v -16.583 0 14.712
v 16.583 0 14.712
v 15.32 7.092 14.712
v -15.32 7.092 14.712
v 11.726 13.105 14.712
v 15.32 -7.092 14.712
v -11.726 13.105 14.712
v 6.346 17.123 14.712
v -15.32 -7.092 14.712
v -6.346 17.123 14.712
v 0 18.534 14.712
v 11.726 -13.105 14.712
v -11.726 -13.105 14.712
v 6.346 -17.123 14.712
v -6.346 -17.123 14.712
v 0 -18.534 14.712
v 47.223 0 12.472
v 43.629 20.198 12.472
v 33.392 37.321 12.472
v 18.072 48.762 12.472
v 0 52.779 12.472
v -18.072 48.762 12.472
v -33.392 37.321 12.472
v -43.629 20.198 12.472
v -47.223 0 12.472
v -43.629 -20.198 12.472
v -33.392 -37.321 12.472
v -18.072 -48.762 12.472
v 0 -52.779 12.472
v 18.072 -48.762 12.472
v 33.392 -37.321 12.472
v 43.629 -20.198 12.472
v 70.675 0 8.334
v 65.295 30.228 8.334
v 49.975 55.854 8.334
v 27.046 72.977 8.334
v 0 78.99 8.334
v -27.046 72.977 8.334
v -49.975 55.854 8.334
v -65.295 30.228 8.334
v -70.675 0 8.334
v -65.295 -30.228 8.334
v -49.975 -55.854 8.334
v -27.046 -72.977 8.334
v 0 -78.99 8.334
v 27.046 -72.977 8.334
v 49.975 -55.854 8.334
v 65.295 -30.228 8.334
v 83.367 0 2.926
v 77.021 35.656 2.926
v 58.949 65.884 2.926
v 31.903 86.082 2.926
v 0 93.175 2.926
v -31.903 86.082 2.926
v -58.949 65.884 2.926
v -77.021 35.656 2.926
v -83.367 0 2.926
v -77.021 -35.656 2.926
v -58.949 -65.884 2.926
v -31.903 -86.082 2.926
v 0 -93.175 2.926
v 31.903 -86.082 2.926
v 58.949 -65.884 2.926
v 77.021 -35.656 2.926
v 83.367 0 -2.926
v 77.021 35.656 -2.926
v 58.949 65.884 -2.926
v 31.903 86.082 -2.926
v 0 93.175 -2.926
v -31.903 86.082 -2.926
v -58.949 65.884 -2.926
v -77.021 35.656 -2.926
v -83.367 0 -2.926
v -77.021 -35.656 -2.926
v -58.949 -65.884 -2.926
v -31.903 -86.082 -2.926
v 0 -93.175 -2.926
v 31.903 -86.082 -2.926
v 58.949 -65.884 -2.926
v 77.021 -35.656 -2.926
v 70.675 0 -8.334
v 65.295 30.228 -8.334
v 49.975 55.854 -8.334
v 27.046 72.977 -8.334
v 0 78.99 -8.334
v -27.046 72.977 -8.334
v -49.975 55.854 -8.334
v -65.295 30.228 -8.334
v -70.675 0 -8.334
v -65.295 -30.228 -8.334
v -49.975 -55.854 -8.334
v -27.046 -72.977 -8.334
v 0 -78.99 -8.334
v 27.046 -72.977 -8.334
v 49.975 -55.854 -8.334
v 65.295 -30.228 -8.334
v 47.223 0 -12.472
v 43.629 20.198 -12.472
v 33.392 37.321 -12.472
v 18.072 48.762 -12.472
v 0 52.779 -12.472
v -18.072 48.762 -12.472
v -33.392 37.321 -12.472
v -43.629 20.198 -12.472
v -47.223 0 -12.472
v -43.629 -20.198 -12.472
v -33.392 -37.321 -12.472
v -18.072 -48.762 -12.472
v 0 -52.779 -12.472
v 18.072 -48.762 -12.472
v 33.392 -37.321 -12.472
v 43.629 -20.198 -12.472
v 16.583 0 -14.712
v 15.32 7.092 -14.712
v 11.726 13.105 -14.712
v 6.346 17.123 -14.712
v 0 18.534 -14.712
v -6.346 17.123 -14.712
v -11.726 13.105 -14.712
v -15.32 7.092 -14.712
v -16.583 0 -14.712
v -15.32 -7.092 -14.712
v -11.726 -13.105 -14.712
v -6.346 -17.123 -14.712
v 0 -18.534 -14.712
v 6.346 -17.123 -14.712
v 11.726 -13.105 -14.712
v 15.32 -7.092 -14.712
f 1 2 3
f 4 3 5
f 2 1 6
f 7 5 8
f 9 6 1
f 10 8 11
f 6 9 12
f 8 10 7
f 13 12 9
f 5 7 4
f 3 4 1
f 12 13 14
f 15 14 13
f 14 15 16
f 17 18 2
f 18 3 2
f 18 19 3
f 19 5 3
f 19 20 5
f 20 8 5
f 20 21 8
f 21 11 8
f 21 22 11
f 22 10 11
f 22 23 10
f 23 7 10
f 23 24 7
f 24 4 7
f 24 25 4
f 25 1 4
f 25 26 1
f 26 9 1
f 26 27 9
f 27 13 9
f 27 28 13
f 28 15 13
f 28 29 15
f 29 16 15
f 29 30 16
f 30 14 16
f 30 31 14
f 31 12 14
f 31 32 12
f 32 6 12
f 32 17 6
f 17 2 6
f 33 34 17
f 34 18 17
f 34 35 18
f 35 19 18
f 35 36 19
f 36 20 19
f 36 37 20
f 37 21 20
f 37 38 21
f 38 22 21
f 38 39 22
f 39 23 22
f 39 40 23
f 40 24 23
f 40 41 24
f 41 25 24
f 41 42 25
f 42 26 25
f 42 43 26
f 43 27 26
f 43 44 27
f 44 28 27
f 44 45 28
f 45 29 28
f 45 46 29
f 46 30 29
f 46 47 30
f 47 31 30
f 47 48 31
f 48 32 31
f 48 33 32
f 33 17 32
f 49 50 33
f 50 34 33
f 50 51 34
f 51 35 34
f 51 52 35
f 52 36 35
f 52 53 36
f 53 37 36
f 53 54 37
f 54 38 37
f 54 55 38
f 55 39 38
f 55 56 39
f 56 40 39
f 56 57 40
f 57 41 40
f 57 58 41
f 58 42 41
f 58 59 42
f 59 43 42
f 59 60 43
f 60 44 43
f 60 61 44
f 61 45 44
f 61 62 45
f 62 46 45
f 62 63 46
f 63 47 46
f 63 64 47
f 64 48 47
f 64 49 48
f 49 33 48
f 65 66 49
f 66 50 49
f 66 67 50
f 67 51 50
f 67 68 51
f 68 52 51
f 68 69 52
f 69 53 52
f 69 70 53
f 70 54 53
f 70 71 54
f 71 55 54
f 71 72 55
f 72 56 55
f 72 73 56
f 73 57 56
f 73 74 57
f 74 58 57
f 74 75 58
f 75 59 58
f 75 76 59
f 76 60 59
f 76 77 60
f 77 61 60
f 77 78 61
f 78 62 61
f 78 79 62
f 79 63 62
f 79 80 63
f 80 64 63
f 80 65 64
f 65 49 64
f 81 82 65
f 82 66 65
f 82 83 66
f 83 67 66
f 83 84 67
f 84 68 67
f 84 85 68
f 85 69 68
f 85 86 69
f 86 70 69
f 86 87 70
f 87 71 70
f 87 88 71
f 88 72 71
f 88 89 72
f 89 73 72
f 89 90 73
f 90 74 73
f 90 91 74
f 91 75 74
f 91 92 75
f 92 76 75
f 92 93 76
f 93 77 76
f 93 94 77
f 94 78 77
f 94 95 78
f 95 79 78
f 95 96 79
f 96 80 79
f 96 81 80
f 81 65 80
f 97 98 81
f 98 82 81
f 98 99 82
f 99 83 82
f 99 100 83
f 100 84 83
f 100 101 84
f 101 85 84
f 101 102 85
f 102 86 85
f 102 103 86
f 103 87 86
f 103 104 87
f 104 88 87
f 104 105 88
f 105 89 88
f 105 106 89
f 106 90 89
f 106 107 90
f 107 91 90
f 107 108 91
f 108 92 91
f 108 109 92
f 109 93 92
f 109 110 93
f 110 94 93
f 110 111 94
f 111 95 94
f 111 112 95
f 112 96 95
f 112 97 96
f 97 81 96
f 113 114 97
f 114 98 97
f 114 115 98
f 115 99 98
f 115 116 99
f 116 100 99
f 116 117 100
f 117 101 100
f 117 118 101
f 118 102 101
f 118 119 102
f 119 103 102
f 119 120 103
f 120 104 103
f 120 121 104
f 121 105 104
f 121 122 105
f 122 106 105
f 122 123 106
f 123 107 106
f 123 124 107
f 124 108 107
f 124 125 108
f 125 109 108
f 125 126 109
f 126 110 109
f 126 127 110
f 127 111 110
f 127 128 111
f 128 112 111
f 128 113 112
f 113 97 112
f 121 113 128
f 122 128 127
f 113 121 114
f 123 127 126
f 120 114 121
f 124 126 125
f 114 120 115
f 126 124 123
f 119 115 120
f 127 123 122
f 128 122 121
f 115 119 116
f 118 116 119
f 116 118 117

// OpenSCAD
// Generated by SolidPython 1.0.1 on 2020-07-29 00:46:53


scale(v = [17, 19, 3]) {
	sphere(r = 5);
}
/***********************************************
*********      SolidPython code:      **********
************************************************
 
# import packages: SolidPython
from solid import *
from solid.utils import *
from itertools import chain, combinations, permutations


class Resize:

    def __init__(self, scad_file):
        self.scad_file = scad_file
        #self.scad_file = import_scad(scad_file)
        # cone/cylinder param:
        self.r1 = 0
        self.r2 = 0
        self.h = 0
        # rectangular prism param:
        self.w = 0
        self.l = 0
        # ellipse param:
        self.r = 0

    # import OpenScad code (file name corresponds to shape)


    # classify shape + parameters
    def assign(self, param1, param2, param3):
        if self.scad_file == 'cone.scad':
            self.r1 = param1
            self.r2 = param2
            self.h = param3
        elif self.scad_file == 'cylinder.scad':
            self.r1 = param1
            self.r2 = param2
            self.h = param3
        elif self.scad_file == 'rectangularPrism.scad':
            self.h = param1
            self.l = param2
            self.w = param3
        else:
            self.r = param1
            self.h = param2

    # resize parameters
    def iterate(self):
        x = range(3, 20, 2)
        i = 1
        if self.scad_file == 'cone.scad':
            tempList = list(permutations(x, 2))
            for temp in tempList:
                param1 = temp[0]
                param2 = temp[1]
                filepath = 'produced_scad_files/' + 'cone' + str(param1) + '_' + str(param2) + '_' + '.scad'
                scad_render_to_file(cylinder(h=param1, r1=param2, r2=0), filepath)

        elif self.scad_file == 'cylinder.scad':
            tempList = list(permutations(x, 3))
            for temp in tempList:
                param1 = temp[0]
                param2 = temp[1]
                filepath = 'produced_scad_files/' + 'cylinder' + str(param1) + '_' + str(param2) + '_' + '.scad'
                scad_render_to_file(cylinder(h=param1, r1=param2, r2=param2), filepath)

        elif self.scad_file == 'rectangularPrism.scad':
            tempList = list(permutations(x, 3))
            for temp in tempList:
                param1 = temp[0]
                param2 = temp[1]
                param3 = temp[2]
                filepath = 'produced_scad_files/' + 'rectangularPrism' + str(param1) + '_' + str(param2) + '_' + str(
                    param3) + '.scad'
                scad_render_to_file(cube(size=(param1, param2, param3)), filepath)

        elif self.scad_file == 'ellipse.scad':
            tempList = list(permutations(x, 4))
            for temp in tempList:
                param1 = temp[0]
                param2 = temp[1]
                param3 = temp[2]
                param4 = temp[3]
                filepath = 'produced_scad_files/' + 'ellipse' + str(param1) + '_' + str(param2) + '_' + str(param3) + '_' + str(param4) + '.scad'
                scad_render_to_file(scale([param1, param2, param3])(sphere(r=param4)), filepath)

    def render_to_scadfile(self):
        scad_render_to_file(scad, 'example.scad') 
 
************************************************/
